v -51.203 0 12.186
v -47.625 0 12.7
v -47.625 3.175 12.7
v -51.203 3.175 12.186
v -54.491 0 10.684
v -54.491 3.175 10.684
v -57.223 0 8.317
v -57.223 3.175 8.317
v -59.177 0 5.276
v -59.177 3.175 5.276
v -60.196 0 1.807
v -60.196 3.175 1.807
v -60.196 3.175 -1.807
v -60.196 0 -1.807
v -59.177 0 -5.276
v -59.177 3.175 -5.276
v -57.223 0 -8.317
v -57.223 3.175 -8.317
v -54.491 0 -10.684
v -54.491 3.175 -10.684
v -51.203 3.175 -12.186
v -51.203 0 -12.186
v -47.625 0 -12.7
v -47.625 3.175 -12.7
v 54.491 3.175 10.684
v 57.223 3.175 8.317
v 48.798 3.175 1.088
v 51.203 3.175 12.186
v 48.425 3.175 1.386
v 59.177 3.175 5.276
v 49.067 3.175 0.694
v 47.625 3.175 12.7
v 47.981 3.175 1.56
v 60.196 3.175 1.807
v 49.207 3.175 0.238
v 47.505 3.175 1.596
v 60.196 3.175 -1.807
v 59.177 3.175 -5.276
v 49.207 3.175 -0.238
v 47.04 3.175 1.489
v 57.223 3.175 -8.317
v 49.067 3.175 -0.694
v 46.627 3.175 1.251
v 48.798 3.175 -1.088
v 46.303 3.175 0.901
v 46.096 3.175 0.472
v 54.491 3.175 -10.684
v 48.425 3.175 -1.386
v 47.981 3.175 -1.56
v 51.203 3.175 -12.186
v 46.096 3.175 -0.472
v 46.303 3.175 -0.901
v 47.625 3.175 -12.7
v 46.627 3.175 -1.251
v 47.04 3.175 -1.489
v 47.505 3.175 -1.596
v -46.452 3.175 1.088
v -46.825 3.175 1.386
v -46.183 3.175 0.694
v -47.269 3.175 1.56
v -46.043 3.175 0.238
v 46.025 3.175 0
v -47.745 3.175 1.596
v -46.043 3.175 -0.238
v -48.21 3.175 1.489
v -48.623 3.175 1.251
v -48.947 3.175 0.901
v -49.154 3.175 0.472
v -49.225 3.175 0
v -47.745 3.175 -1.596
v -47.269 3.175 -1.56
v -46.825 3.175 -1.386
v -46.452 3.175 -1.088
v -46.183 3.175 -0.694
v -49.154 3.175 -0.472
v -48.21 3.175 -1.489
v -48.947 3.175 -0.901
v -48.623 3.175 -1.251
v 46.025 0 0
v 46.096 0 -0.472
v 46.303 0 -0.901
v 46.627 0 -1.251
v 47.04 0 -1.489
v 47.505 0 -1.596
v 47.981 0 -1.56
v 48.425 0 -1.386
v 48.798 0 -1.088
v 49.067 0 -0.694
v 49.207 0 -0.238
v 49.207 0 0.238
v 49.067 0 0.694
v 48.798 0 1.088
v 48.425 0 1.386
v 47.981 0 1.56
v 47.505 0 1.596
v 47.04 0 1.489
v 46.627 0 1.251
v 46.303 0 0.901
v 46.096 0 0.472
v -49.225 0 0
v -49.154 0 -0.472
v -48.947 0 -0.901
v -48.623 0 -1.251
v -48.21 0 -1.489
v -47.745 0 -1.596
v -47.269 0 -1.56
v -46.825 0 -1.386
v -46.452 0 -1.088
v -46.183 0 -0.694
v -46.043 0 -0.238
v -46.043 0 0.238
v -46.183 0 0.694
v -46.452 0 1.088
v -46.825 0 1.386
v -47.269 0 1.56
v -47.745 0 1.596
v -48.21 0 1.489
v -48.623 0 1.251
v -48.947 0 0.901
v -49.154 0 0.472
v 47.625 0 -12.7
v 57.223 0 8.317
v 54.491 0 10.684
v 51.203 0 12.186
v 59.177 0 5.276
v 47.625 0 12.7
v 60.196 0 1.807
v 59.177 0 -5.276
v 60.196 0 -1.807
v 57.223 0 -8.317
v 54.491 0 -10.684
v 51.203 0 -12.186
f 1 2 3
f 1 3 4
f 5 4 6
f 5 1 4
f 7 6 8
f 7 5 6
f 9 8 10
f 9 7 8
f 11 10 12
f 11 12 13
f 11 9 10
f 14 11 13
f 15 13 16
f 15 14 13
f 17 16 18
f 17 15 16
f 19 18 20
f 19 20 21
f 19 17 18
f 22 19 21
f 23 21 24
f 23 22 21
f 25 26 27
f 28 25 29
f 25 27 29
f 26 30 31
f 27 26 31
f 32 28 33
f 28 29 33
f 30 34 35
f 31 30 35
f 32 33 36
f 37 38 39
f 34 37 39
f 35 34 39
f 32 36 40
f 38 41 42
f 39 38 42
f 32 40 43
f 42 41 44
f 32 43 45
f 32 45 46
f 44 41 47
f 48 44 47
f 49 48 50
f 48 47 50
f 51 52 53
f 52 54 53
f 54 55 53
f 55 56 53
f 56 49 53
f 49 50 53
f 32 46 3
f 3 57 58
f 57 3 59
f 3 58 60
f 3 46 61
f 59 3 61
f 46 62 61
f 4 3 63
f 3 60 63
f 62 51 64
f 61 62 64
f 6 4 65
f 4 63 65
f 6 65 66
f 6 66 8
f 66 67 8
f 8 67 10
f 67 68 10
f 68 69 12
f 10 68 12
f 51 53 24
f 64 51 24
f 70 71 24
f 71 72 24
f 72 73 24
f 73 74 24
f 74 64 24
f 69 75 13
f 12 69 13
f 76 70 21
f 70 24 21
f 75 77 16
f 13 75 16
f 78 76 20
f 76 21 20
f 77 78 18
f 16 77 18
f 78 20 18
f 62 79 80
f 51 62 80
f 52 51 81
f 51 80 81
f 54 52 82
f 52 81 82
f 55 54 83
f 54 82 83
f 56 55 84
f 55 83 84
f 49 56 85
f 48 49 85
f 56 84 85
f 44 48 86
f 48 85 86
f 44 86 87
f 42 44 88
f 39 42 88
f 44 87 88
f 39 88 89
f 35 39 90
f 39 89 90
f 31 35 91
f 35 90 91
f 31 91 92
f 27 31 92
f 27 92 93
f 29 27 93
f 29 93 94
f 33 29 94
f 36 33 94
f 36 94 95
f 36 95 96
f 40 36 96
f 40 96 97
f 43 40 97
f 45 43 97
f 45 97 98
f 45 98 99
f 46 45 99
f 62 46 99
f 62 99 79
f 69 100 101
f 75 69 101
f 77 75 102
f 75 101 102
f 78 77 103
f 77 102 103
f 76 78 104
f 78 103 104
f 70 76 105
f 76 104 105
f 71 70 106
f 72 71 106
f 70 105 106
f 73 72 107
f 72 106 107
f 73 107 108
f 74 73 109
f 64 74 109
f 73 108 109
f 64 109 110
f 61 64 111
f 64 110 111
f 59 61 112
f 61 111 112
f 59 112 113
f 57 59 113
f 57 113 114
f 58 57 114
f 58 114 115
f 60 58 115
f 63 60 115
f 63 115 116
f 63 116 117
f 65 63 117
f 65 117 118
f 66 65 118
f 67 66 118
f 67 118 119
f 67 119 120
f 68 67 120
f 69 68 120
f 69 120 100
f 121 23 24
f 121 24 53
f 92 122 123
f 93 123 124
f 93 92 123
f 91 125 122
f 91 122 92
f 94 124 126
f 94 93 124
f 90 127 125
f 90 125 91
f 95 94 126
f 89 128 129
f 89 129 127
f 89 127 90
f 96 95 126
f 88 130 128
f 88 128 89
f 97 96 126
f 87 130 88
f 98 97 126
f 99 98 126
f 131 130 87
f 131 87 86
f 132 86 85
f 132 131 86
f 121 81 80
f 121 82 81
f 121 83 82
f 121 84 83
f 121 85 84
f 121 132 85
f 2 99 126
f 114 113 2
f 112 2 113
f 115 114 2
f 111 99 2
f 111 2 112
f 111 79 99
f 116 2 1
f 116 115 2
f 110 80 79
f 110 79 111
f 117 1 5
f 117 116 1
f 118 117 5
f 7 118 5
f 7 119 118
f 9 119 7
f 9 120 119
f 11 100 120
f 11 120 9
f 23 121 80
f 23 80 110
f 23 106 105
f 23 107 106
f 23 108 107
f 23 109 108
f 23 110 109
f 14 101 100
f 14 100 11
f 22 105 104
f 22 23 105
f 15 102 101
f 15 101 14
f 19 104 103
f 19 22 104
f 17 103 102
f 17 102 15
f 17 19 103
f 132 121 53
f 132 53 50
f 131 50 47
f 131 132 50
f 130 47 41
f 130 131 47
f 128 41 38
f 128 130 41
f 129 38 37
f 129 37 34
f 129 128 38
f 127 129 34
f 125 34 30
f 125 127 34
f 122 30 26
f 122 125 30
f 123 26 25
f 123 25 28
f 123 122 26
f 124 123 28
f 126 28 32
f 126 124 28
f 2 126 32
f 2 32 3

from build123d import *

# Parameters (mm, degrees)
BOSS_EXTRUDE1_DEPTH  = 3.175
M3_CLEARANCE_HOLE1_D = 3.2


with BuildPart() as part:
    # Sketch1 → Boss-Extrude1 (new body)
    with BuildSketch(Plane(origin=(0, 0, 0), x_dir=(1, 0, 0), z_dir=(0, 1, 0))):
        with BuildLine():
            Line((-47.625, 12.7), (47.625, 12.7))
            ThreePointArc((47.625, 12.7), (60.325, 0), (47.625, -12.7))
            Line((47.625, -12.7), (-47.625, -12.7))
            ThreePointArc((-47.625, -12.7), (-60.325, 0), (-47.625, 12.7))
        make_face()
    extrude(amount=BOSS_EXTRUDE1_DEPTH)

    # M3 Clearance Hole1 (through all)
    with Locations(Plane(origin=(0, 3.175, 0), x_dir=(1, 0, 0), z_dir=(0, 1, 0))):
        with Locations((-47.625, 0), (47.625, 0)):
            Hole(M3_CLEARANCE_HOLE1_D / 2)


solid = part.part
